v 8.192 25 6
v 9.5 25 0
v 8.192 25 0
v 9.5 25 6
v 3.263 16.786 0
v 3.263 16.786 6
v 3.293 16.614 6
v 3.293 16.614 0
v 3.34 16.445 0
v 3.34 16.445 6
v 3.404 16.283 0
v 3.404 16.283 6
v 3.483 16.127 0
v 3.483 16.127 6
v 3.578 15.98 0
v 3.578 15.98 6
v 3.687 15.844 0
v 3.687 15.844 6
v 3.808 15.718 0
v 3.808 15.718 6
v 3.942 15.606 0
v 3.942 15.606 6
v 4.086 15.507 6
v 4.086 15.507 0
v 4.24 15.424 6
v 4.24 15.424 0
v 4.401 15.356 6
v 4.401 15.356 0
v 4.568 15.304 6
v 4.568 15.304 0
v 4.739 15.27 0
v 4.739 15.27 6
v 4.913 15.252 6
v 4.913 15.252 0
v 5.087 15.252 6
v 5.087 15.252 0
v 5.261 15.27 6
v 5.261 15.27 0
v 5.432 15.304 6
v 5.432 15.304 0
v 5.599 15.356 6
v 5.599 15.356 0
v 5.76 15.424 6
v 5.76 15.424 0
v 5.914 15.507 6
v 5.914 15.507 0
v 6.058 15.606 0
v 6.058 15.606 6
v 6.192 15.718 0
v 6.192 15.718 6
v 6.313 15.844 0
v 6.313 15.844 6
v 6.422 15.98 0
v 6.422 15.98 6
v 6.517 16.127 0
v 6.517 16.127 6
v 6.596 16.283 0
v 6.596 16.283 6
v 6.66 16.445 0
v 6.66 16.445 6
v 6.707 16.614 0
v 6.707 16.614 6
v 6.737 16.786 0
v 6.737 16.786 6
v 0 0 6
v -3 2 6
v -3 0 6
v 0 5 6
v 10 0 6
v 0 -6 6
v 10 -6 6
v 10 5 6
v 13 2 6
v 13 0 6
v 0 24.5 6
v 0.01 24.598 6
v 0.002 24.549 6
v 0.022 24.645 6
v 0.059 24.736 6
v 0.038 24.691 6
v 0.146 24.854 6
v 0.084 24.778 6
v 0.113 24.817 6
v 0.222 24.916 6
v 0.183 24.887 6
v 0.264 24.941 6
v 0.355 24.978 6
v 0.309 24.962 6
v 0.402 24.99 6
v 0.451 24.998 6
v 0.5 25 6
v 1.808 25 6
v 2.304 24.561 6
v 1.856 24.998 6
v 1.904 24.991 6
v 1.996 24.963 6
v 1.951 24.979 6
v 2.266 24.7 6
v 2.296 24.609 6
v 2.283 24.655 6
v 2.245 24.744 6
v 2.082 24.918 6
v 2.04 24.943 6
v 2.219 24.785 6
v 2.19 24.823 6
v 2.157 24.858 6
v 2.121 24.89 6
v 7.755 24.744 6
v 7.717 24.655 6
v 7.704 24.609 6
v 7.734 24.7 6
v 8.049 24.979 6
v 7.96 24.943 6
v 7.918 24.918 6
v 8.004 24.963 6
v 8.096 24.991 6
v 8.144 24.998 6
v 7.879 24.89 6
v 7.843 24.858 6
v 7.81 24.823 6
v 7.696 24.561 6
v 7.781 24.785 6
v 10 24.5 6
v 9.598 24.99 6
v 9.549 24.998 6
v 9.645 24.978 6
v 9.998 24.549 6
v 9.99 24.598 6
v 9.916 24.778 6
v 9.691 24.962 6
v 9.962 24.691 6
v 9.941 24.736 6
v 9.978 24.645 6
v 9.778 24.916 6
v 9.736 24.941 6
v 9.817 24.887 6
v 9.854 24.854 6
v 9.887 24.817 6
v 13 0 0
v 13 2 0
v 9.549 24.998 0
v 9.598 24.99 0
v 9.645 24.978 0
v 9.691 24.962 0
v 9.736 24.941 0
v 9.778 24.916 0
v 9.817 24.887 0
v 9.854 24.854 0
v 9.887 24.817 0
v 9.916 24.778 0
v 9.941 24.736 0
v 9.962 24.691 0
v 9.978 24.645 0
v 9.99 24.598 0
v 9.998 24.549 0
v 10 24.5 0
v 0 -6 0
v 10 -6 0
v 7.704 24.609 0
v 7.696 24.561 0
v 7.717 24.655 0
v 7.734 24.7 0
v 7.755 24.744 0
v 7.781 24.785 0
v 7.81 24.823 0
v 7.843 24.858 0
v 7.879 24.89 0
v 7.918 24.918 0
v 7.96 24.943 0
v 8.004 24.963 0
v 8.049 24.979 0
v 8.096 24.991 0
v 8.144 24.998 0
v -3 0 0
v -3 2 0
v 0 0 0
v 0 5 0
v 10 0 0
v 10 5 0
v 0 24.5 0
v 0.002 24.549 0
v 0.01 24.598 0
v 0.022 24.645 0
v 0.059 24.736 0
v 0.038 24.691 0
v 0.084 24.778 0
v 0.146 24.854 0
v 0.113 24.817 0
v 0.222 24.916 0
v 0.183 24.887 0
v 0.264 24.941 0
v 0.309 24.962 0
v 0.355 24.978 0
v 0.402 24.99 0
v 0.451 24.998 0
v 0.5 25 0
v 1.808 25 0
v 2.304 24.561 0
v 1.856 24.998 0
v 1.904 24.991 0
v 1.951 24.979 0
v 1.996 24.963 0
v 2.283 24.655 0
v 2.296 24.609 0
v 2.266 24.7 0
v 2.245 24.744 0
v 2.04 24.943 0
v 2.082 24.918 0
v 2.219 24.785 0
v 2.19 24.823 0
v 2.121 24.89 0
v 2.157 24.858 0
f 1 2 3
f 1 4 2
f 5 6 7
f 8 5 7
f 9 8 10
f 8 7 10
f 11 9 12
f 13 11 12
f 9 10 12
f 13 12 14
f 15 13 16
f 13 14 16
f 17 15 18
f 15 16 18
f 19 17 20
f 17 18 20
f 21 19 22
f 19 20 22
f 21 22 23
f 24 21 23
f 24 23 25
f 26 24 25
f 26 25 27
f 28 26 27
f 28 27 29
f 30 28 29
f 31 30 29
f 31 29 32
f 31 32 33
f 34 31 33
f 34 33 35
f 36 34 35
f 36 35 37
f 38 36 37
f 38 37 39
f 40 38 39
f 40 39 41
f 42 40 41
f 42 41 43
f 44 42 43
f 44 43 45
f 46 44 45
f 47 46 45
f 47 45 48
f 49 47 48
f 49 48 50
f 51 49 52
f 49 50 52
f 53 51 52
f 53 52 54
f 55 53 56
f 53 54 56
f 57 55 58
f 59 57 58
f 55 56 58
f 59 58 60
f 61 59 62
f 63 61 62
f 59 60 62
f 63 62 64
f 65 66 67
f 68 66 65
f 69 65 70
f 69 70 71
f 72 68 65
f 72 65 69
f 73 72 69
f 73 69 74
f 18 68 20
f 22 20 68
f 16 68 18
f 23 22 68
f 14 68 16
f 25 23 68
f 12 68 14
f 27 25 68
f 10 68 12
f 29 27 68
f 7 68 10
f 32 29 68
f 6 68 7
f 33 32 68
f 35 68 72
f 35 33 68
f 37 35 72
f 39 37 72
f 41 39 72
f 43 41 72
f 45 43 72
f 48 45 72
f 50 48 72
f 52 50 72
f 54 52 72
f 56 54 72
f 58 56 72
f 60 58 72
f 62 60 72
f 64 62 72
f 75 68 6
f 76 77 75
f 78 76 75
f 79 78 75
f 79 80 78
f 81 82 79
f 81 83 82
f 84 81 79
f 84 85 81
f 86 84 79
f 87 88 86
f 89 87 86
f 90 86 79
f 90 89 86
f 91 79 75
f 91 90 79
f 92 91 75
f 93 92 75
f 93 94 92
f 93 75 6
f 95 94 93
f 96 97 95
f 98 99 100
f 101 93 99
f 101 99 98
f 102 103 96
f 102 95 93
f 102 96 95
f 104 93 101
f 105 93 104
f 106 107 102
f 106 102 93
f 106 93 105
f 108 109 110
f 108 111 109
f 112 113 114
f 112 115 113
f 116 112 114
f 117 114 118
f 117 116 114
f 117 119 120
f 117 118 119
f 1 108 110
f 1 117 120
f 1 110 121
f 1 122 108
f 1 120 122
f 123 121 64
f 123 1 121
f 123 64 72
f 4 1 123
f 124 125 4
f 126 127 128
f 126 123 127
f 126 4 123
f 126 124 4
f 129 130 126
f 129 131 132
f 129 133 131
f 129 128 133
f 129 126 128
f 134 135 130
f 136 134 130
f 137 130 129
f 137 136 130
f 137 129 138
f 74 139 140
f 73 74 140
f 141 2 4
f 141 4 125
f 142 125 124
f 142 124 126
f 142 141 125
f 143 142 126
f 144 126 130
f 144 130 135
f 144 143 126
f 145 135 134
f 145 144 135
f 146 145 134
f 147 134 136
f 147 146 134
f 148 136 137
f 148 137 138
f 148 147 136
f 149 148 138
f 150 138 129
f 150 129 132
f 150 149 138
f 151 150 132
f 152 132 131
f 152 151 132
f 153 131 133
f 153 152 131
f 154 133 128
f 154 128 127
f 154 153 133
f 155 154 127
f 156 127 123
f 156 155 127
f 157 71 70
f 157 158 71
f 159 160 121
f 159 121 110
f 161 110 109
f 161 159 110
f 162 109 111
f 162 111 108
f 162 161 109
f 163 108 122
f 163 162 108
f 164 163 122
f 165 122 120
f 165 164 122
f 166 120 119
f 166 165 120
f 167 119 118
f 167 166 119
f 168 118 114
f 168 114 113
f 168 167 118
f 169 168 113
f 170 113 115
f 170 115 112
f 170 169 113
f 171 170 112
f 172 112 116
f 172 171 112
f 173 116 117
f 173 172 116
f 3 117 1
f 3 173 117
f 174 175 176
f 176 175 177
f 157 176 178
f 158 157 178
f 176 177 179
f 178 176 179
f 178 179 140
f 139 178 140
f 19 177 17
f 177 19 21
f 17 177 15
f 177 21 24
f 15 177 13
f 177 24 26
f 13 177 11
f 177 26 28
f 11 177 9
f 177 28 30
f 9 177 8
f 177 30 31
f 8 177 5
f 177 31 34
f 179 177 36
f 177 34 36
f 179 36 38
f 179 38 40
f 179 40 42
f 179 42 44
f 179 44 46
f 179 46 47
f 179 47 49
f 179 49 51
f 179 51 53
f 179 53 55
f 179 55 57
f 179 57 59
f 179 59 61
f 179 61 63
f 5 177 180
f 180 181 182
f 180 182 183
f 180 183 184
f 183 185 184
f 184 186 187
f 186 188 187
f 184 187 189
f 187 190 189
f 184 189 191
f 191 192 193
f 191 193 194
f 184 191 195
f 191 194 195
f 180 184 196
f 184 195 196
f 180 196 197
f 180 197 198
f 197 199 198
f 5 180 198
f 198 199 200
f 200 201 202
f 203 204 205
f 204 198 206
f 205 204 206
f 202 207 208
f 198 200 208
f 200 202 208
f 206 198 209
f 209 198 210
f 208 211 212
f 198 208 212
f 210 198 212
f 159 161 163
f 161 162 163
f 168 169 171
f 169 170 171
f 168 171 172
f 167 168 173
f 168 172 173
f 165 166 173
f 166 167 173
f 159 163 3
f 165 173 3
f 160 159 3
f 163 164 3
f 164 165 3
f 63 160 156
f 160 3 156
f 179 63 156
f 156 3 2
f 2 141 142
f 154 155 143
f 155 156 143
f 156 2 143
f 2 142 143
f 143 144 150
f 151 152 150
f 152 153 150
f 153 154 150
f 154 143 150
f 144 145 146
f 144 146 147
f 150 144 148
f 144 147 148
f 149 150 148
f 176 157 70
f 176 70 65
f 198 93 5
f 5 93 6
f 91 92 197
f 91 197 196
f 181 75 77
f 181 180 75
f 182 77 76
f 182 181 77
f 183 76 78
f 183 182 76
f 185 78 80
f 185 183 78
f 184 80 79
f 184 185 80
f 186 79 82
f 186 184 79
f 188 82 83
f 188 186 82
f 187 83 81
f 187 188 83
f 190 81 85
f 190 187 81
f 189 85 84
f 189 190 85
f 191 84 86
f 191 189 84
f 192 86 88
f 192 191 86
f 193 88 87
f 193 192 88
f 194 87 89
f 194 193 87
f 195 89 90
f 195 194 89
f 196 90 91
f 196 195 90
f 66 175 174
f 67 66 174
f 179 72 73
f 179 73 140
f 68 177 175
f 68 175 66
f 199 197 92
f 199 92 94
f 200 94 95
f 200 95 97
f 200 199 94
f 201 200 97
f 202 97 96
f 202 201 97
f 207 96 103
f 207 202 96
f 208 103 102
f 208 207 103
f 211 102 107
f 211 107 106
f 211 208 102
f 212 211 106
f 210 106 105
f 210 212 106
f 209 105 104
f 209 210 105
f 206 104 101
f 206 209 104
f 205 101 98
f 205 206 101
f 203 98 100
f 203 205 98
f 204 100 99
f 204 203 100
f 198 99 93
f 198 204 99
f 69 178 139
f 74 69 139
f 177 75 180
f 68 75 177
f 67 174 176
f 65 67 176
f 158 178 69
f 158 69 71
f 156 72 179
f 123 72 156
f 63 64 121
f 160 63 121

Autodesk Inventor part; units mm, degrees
ref_plane "YZ Plane" through (0, 0, 0) normal (1, 0, 0) x (0, 1, 0)
ref_plane "XZ Plane" through (0, 0, 0) normal (0, 1, 0) x (-1, 0, 0)
ref_plane "XY Plane" through (0, 0, 0) normal (0, 0, 1) x (1, 0, 0)
sketch "Sketch1" plane through (0, 0, 0) normal (0, 0, 1) x (1, 0, 0)
  line L0 (0, -6) -> (0, 0) projected
  line L1 (-9, 0) -> (0, 0) projected
  line L2 (0, -6) -> (-9, -6) projected
  line L3 (0, 0) -> (10, 0) projected
  line L4 (0, 0) -> (0, -6) projected
  line L5 (10, -6) -> (0, -6) projected
  line L6 (10, 0) -> (10, -6) projected
  line L7 (0, -6) -> (-9, -6) projected
  line L8 (-9, 0) -> (0, 0) projected
  line L9 (0, -6) -> (10, -6)
  line L10 (10, -6) -> (10, 0)
  line L11 (10, 0) -> (0, 0)
  line L12 (0, 0) -> (0, -6)
  line L13 (-3, 0) -> (13, 0)
  line L14 (13, 0) -> (13, 2)
  line L15 (13, 2) -> (-3, 2)
  line L16 (-3, 2) -> (-3, 0)
  line L17 (-9, -6) -> (-9, 0) projected
  line L18 (-9, -6) -> (-9, 0) projected
  line L19 (0, -6) -> (0, 0) projected
  point P0 (5, 2)
  point P1 (5, 0)
  dimension "d0" = 16
  dimension "d2" = 2
extrude "Extrusion1" add sketch "Sketch1" along normal blind 6 contours L0 L3 L6 L5 | L1 L16 L15 L14 L13 L3
sketch "Sketch2" plane through (0, 0, 6) normal (0, 0, 1) x (1, 0, 0)
  line L0 (0, 0) -> (0, -6) projected
  line L1 (0, -6) -> (10, -6) projected
  line L2 (10, -6) -> (10, 0) projected
  line L3 (13, 2) -> (-3, 2) projected
  line L4 (0, 2) -> (10, 2)
  line L5 (10, 2) -> (10, 25)
  line L6 (10, 25) -> (0, 25)
  line L7 (0, 25) -> (0, 2)
  dimension "d6" = 31
  dimension "d21" = 10
extrude "Extrusion2" add sketch "Sketch2" against normal blind 6
chamfer "Chamfer1" distance 3 angle 45 2 edges at (0, 2, 3) (10, 2, 3)
sketch "Sketch3" plane through (0, 0, 6) normal (0, 0, 1) x (1, 0, 0)
  line L0 (10, 5) -> (10, 25) projected
  line L1 (10, 25) -> (0, 25) projected
  line L2 (0, 25) -> (0, 5) projected
  line L3 (2.25, 25) -> (7.75, 25)
  line L4 (7.75, 25) -> (7.75, 17) construction
  line L5 (7.75, 17) -> (2.25, 17) construction
  line L6 (2.25, 17) -> (2.25, 25) construction
  circle A0 centre (5, 17) radius 1.75
  line L7 (-3, 0) -> (0, 0) projected
  line L8 (0, 0) -> (0, -6) projected
  line L9 (0, -6) -> (10, -6) projected
  line L10 (10, -6) -> (10, 0) projected
  line L11 (10, 0) -> (13, 0) projected
  line L12 (13, 0) -> (13, 2) projected
  line L13 (10, 5) -> (13, 2) projected
  line L14 (10, 5) -> (10, 25) projected
  line L15 (10, 25) -> (0, 25) projected
  line L16 (0, 25) -> (0, 5) projected
  line L17 (-3, 2) -> (0, 5) projected
  line L18 (-3, 2) -> (-3, 0) projected
  line L19 (6.7368, 16.7858) -> (7.75, 25)
  line L20 (2.25, 25) -> (3.2632, 16.7858)
  dimension "d12" = 2.25
  dimension "d13" = 2.25
  dimension "d14" = 8
  dimension "d17" = 3.5
extrude "Extrusion3" cut sketch "Sketch3" against normal blind 6 contours L19 A0 L20 L1 | A0
fillet "Fillet1" radius 0.5 4 edges at (7.75, 25, 3) (2.25, 25, 3) (0, 25, 3) (10, 25, 3)
properties part number "arm 1"
